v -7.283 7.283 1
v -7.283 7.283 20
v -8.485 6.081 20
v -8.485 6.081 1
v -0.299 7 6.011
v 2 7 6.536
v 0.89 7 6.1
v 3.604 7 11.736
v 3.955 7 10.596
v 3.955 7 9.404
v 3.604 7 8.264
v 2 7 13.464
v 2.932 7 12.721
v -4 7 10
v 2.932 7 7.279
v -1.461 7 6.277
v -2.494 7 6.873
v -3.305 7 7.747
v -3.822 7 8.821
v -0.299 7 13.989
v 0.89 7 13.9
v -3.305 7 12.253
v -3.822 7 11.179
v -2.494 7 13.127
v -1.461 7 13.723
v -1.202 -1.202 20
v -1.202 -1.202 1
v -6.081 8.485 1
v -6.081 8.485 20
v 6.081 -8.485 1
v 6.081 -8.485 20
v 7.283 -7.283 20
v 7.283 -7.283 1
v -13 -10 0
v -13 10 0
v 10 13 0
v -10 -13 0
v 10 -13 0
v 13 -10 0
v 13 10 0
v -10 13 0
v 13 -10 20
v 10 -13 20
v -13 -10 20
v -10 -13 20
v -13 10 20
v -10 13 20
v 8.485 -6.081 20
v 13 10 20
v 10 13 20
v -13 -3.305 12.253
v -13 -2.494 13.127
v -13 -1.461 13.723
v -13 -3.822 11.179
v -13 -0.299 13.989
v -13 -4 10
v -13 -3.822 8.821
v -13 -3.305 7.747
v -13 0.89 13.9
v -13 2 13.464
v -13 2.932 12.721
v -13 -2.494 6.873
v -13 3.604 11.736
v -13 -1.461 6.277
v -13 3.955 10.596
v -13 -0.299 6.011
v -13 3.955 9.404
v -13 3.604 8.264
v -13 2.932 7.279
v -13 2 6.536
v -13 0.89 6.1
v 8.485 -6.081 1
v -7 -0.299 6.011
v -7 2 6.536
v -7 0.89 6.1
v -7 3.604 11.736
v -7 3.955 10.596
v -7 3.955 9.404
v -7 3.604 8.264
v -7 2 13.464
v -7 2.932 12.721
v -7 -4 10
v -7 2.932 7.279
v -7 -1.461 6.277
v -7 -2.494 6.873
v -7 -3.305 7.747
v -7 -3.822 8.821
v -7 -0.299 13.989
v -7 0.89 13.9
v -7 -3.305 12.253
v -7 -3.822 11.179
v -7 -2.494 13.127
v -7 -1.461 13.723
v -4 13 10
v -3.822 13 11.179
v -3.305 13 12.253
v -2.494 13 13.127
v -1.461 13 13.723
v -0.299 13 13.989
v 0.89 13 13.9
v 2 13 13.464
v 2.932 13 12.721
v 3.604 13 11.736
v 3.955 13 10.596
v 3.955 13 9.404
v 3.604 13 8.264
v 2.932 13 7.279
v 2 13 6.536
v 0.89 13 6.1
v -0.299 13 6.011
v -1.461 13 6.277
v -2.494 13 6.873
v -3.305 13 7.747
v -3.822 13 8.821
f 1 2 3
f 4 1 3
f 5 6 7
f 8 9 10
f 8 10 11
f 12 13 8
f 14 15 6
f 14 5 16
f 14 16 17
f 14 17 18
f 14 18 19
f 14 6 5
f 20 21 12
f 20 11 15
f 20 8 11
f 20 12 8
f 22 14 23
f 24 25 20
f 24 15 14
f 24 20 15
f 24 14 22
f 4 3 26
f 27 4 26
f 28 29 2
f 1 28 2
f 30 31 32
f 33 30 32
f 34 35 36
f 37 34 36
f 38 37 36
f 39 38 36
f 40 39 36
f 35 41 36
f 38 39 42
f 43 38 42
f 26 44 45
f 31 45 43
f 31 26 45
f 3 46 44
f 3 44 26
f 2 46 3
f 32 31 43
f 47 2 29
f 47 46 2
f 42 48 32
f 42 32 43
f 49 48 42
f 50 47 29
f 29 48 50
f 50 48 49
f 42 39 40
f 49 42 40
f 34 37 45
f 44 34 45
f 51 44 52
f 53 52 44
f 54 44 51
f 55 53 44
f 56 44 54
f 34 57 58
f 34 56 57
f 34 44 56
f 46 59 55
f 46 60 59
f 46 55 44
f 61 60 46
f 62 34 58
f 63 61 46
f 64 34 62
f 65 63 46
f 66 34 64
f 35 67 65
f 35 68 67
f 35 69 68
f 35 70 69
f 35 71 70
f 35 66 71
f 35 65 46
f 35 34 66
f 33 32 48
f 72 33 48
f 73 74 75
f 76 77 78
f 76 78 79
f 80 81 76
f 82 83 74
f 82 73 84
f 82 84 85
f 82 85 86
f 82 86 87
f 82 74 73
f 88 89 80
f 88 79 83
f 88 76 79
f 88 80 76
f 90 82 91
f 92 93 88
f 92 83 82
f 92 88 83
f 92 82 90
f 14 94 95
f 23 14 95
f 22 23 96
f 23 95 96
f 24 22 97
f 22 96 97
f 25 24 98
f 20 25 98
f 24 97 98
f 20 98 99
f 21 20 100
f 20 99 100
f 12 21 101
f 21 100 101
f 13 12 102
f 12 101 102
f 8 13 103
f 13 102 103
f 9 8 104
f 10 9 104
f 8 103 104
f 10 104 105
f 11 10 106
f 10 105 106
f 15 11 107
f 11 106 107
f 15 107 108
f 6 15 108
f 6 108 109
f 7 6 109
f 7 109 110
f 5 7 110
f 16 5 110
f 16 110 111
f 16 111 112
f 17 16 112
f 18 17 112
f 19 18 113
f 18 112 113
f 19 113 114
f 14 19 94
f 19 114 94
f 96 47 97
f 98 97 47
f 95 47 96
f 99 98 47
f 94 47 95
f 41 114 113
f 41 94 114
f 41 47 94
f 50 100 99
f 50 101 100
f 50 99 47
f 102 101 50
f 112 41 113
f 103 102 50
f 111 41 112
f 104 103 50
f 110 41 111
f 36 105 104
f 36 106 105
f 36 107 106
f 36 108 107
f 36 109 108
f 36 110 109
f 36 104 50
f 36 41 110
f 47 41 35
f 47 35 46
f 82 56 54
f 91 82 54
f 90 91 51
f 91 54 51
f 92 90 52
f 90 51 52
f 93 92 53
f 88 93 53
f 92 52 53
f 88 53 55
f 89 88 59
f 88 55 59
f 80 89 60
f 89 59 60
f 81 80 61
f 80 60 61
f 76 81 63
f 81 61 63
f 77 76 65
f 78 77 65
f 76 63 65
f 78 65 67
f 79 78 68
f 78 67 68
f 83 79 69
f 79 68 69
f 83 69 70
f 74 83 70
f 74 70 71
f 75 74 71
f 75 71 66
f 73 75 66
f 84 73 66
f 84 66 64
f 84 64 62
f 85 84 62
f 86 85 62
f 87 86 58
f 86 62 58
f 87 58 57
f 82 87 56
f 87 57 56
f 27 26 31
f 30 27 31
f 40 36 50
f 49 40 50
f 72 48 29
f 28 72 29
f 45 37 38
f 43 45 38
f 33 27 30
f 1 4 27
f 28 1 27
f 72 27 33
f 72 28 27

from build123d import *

# Parameters (mm, degrees)
F0_W     = 26
F0_H     = 26
F1_DEPTH = 20
F2_SIZE  = 3
F4_DEPTH = 19
F5_R     = 4
F6_DEPTH = 6
F7_R     = 4
F8_DEPTH = 6


with BuildPart() as f1:
    # F0 (on Top) → F1 (new body)
    with BuildSketch(Plane.XY):
        Rectangle(F0_W, F0_H)
    extrude(amount=F1_DEPTH)

    # F2
    f2_edges = [f1.edges().sort_by_distance(p)[0] for p in [
        (-13, -13, 10),
        (13, -13, 10),
        (13, 13, 10),
        (-13, 13, 10),
    ]]
    chamfer(f2_edges, length=F2_SIZE)

    # F3 (on face) → F4 (cut)
    with BuildSketch(Plane.XY.offset(20)):
        Polygon((-6.081118, 8.485281), (-7.2832, 7.2832), (0, 0), (7.2832, -7.2832), (8.485281, -6.081118), align=None)
        Polygon((0, 0), (-7.2832, 7.2832), (-8.485281, 6.081118), (-1.202082, -1.202082), align=None)
        Polygon((7.2832, -7.2832), (0, 0), (-1.202082, -1.202082), (6.081118, -8.485281), align=None)
    extrude(amount=-F4_DEPTH, mode=Mode.SUBTRACT)

    # F5 (on face) → F6 (cut)
    with BuildSketch(Plane(origin=(-13, 0, 0), x_dir=(0, -1, 0), z_dir=(-1, 0, 0))):
        with Locations((0, 10)):
            Circle(F5_R)
    extrude(amount=-F6_DEPTH, mode=Mode.SUBTRACT)

    # F7 (on face) → F8 (cut)
    with BuildSketch(Plane(origin=(0, 13, 0), x_dir=(-1, 0, 0), z_dir=(0, 1, 0))):
        with Locations((0, 10)):
            Circle(F7_R)
    extrude(amount=-F8_DEPTH, mode=Mode.SUBTRACT)


solid = f1.part
